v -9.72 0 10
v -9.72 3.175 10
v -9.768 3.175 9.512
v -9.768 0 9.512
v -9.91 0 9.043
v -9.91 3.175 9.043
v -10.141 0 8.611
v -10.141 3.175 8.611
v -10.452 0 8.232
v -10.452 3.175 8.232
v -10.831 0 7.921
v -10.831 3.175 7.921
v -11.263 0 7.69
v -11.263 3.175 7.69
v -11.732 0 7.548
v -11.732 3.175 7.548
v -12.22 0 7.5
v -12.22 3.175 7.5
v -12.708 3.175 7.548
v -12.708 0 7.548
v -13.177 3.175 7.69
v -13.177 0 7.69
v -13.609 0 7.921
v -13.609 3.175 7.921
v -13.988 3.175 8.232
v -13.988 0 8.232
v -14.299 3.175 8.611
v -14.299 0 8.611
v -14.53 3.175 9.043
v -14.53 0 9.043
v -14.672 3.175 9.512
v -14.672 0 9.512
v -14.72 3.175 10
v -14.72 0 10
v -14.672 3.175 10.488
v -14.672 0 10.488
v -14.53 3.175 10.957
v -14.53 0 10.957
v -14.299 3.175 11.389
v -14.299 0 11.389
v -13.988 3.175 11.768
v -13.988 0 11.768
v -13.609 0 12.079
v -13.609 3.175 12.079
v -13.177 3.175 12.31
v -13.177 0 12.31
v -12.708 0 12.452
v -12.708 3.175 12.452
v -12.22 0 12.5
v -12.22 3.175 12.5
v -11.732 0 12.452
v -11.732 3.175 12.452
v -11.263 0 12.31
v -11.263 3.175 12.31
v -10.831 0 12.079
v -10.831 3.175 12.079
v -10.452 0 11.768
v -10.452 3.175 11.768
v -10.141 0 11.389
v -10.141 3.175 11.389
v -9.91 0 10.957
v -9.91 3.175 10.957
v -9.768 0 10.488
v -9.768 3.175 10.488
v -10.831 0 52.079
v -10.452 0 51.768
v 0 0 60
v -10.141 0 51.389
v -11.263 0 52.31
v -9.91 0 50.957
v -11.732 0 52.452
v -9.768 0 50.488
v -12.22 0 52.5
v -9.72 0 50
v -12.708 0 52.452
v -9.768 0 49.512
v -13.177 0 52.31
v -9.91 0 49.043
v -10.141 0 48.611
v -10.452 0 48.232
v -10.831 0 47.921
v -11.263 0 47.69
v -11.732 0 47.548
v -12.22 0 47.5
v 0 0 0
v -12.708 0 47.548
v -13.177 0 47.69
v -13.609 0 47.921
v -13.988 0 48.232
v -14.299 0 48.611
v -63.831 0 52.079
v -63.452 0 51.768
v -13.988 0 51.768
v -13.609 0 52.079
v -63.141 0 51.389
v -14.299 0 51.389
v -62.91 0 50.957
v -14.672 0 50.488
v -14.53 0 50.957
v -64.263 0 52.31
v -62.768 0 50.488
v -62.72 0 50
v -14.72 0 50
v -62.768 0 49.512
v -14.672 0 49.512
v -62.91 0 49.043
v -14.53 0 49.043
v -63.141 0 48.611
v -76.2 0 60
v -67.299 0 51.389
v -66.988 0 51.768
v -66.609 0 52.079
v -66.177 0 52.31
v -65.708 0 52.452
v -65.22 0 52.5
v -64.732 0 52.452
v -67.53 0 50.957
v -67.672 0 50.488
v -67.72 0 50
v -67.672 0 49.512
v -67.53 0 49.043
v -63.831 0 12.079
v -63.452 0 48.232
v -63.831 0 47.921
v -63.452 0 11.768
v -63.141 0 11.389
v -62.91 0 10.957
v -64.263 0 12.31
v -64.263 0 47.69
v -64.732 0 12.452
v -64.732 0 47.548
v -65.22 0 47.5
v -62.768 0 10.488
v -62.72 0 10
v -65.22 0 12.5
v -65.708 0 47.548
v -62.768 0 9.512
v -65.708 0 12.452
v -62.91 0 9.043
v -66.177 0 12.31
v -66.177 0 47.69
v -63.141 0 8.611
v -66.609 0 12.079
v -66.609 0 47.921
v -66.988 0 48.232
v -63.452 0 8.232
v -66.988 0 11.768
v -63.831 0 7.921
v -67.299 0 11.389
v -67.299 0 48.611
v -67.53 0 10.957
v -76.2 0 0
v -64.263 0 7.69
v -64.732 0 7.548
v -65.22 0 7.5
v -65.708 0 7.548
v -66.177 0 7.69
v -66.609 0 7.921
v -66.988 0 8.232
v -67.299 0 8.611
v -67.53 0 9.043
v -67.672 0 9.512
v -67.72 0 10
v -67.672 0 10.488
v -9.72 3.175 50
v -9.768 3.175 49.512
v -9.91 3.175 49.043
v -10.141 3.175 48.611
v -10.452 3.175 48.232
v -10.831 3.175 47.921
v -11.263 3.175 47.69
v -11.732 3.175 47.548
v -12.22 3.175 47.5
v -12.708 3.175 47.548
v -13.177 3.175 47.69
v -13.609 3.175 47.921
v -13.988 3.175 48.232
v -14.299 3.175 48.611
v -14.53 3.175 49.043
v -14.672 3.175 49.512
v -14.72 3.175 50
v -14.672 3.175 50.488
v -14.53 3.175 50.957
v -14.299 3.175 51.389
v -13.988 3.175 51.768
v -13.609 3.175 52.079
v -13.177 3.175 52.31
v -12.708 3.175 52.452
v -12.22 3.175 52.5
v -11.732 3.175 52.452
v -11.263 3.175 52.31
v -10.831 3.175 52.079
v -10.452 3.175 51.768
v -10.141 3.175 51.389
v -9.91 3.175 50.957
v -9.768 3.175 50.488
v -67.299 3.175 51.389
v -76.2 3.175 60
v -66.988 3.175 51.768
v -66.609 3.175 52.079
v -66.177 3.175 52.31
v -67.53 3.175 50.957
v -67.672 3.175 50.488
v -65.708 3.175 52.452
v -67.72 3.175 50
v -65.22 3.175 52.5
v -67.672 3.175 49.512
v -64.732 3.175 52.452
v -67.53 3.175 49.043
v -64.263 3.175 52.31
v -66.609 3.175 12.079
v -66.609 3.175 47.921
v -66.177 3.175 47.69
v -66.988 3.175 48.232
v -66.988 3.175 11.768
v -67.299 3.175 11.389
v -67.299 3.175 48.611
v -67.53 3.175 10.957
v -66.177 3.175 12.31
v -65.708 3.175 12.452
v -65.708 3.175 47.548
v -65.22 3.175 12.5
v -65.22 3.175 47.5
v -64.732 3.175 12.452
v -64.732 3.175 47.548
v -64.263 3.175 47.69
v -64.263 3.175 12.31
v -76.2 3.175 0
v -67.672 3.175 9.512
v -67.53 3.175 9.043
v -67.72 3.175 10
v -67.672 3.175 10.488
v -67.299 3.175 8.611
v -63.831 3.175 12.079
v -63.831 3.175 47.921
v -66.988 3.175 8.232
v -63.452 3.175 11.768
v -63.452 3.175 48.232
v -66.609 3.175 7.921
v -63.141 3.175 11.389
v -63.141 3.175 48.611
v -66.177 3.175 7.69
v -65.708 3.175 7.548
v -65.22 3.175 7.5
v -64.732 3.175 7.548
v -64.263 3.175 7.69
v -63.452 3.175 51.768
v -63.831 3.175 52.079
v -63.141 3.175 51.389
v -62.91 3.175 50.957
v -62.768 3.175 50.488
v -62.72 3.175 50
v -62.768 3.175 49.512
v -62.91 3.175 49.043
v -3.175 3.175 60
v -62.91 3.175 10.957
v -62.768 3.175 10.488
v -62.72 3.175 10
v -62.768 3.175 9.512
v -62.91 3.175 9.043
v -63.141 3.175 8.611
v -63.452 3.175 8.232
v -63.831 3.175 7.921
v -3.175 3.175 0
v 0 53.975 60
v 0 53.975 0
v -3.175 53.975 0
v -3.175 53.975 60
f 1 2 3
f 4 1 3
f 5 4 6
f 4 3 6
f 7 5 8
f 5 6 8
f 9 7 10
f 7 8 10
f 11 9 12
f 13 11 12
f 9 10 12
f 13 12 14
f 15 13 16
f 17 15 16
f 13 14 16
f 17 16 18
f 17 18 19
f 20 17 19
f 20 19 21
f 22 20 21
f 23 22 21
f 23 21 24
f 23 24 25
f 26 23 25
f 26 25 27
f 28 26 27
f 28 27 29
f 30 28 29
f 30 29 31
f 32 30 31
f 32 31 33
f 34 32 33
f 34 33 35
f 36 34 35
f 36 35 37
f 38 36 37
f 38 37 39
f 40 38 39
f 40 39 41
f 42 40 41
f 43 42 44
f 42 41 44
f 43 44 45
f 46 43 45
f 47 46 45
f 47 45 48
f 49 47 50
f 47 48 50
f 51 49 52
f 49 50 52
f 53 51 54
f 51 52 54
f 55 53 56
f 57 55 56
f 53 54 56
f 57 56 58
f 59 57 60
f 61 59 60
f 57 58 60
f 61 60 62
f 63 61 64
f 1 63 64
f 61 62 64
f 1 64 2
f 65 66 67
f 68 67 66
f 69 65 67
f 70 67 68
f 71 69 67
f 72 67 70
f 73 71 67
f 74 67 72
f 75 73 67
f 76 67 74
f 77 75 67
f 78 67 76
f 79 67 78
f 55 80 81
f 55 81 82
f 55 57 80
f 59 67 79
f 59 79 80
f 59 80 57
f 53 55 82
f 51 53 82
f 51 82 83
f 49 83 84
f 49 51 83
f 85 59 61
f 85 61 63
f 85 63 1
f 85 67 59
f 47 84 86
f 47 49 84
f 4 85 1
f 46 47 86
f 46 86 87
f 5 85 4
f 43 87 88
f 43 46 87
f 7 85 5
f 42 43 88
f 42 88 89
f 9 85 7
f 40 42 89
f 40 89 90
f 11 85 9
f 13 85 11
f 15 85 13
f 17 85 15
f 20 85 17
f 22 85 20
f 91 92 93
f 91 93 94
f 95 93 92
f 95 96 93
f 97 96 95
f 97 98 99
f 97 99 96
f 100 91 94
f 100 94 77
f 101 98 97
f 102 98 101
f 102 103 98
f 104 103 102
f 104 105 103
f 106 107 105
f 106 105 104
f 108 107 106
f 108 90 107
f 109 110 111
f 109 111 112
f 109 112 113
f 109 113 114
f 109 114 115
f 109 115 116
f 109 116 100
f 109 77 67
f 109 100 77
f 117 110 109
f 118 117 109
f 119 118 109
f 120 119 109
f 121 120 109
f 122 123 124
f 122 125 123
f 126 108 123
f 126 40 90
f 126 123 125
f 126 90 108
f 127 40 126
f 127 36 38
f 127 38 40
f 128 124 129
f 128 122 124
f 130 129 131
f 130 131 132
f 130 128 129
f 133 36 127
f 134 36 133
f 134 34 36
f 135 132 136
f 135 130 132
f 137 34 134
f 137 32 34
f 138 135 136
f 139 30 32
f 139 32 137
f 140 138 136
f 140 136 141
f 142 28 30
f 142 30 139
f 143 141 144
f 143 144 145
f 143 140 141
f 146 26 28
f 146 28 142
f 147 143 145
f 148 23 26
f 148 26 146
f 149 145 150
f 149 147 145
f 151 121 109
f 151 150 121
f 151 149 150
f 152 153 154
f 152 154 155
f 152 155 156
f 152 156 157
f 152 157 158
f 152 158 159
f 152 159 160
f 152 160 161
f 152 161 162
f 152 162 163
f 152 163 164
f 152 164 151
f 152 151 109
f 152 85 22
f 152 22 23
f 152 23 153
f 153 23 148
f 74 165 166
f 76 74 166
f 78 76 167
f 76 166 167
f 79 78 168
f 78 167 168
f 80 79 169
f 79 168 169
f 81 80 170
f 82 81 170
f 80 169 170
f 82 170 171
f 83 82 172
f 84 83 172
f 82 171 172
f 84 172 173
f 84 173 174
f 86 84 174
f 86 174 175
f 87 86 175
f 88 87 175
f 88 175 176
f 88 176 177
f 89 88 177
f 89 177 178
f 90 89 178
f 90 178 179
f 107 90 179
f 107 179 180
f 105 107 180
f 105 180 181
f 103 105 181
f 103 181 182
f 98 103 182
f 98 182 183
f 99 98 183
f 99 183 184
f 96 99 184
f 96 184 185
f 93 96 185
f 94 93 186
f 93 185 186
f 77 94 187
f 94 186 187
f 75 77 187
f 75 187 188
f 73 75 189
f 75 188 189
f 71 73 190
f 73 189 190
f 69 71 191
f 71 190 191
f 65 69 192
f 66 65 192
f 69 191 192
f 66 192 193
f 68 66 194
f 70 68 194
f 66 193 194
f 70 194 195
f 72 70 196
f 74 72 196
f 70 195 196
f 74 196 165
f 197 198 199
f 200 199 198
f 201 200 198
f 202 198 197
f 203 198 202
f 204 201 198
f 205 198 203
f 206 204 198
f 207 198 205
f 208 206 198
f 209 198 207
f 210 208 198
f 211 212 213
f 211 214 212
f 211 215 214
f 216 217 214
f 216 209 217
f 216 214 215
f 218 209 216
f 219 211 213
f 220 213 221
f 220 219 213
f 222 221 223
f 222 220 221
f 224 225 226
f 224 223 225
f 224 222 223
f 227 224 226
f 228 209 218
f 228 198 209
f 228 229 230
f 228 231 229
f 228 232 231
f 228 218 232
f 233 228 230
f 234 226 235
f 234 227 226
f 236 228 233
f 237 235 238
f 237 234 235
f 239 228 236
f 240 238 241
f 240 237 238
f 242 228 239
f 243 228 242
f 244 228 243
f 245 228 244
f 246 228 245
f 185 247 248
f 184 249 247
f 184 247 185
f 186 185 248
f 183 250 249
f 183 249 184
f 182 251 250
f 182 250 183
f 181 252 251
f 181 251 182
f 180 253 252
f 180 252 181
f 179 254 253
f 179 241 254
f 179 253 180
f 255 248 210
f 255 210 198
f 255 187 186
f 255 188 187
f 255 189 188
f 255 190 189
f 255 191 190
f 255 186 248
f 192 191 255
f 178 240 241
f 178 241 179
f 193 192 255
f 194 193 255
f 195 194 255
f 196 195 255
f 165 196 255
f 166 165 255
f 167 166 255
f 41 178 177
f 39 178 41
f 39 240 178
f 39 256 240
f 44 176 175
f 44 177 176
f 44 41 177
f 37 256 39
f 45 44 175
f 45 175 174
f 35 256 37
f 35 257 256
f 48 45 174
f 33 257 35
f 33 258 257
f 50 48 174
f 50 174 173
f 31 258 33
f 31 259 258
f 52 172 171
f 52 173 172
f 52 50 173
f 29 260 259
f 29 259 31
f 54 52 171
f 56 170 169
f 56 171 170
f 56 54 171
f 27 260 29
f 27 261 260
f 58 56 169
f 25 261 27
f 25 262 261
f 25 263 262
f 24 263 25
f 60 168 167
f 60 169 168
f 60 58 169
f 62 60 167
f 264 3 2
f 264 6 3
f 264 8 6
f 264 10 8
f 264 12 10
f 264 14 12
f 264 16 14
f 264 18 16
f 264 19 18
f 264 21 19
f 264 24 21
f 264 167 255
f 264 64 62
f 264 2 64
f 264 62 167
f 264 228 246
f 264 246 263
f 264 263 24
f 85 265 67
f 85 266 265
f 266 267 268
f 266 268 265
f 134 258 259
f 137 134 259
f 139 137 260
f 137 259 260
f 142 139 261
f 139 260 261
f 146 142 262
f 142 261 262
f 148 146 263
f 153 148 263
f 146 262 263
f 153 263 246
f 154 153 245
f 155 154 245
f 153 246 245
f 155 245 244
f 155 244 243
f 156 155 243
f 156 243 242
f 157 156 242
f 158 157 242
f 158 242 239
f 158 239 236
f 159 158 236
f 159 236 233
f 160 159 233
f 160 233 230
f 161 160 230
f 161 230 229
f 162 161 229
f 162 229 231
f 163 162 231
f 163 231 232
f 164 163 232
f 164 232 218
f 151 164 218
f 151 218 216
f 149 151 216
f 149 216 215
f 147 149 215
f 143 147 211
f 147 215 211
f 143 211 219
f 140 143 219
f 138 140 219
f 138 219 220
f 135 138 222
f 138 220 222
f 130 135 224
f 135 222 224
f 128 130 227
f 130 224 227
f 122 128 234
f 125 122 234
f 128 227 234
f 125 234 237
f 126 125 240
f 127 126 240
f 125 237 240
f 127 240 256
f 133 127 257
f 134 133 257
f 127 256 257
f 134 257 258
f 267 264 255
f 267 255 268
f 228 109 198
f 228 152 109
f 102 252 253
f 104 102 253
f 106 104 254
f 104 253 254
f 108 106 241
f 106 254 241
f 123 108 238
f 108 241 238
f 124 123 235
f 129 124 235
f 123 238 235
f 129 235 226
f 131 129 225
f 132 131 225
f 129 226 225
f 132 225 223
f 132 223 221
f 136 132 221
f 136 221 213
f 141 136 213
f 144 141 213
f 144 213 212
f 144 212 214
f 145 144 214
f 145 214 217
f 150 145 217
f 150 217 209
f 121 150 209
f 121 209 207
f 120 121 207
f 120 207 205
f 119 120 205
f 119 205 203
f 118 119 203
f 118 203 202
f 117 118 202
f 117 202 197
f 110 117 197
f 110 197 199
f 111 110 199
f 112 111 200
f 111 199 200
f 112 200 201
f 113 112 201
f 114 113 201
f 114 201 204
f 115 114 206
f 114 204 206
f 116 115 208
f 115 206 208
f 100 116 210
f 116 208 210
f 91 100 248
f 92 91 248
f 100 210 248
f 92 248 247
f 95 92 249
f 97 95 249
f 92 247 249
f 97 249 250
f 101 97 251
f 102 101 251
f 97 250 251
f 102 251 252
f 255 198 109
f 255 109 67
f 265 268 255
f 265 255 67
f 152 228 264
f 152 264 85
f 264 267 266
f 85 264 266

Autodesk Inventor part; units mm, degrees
ref_plane "YZ Plane" through (0, 0, 0) normal (1, 0, 0) x (0, 1, 0)
ref_plane "XZ Plane" through (0, 0, 0) normal (0, 1, 0) x (-1, 0, 0)
ref_plane "XY Plane" through (0, 0, 0) normal (0, 0, 1) x (1, 0, 0)
sketch "Sketch1" plane through (0, 0, 0) normal (0, 0, 1) x (1, 0, 0)
  line L0 (0, 0) -> (-76.2, 0)
  line L1 (-76.2, 0) -> (-76.2, 3.175)
  line L2 (-76.2, 3.175) -> (-3.175, 3.175)
  line L3 (-3.175, 3.175) -> (-3.175, 53.975)
  line L4 (-3.175, 53.975) -> (0, 53.975)
  line L5 (0, 53.975) -> (0, 0)
  dimension "d0" = 76.2
  dimension "d1" = 50.8
  dimension "d2" = 3.175
extrude "Extrusion1" add sketch "Sketch1" along normal blind 60
sketch "Sketch2" plane through (-76.2, 3.175, 0) normal (0, 1, 0) x (1, 0, 0)
  line L0 (10.98, -50) -> (63.98, -50) construction
  line L1 (63.98, -50) -> (63.98, -10) construction
  line L2 (63.98, -10) -> (10.98, -10) construction
  line L3 (10.98, -10) -> (10.98, -50) construction
  line L4 (0, 0) -> (0, -60) construction
  line L5 (76.2, 0) -> (76.2, -60) construction
  circle A0 centre (10.98, -50) radius 2.5
  circle A1 centre (10.98, -10) radius 2.5
  circle A2 centre (63.98, -50) radius 2.5
  circle A3 centre (63.98, -10) radius 2.5
  point P0 (0, -30)
  point P1 (10.98, -30)
  dimension "d5" = 12.22
  dimension "d6" = 53
  dimension "d7" = 40
  dimension "d8" = 5
extrude "Extrusion2" cut sketch "Sketch2" against normal blind 60
properties part number "Z_Screw_Holder_Bracket"
